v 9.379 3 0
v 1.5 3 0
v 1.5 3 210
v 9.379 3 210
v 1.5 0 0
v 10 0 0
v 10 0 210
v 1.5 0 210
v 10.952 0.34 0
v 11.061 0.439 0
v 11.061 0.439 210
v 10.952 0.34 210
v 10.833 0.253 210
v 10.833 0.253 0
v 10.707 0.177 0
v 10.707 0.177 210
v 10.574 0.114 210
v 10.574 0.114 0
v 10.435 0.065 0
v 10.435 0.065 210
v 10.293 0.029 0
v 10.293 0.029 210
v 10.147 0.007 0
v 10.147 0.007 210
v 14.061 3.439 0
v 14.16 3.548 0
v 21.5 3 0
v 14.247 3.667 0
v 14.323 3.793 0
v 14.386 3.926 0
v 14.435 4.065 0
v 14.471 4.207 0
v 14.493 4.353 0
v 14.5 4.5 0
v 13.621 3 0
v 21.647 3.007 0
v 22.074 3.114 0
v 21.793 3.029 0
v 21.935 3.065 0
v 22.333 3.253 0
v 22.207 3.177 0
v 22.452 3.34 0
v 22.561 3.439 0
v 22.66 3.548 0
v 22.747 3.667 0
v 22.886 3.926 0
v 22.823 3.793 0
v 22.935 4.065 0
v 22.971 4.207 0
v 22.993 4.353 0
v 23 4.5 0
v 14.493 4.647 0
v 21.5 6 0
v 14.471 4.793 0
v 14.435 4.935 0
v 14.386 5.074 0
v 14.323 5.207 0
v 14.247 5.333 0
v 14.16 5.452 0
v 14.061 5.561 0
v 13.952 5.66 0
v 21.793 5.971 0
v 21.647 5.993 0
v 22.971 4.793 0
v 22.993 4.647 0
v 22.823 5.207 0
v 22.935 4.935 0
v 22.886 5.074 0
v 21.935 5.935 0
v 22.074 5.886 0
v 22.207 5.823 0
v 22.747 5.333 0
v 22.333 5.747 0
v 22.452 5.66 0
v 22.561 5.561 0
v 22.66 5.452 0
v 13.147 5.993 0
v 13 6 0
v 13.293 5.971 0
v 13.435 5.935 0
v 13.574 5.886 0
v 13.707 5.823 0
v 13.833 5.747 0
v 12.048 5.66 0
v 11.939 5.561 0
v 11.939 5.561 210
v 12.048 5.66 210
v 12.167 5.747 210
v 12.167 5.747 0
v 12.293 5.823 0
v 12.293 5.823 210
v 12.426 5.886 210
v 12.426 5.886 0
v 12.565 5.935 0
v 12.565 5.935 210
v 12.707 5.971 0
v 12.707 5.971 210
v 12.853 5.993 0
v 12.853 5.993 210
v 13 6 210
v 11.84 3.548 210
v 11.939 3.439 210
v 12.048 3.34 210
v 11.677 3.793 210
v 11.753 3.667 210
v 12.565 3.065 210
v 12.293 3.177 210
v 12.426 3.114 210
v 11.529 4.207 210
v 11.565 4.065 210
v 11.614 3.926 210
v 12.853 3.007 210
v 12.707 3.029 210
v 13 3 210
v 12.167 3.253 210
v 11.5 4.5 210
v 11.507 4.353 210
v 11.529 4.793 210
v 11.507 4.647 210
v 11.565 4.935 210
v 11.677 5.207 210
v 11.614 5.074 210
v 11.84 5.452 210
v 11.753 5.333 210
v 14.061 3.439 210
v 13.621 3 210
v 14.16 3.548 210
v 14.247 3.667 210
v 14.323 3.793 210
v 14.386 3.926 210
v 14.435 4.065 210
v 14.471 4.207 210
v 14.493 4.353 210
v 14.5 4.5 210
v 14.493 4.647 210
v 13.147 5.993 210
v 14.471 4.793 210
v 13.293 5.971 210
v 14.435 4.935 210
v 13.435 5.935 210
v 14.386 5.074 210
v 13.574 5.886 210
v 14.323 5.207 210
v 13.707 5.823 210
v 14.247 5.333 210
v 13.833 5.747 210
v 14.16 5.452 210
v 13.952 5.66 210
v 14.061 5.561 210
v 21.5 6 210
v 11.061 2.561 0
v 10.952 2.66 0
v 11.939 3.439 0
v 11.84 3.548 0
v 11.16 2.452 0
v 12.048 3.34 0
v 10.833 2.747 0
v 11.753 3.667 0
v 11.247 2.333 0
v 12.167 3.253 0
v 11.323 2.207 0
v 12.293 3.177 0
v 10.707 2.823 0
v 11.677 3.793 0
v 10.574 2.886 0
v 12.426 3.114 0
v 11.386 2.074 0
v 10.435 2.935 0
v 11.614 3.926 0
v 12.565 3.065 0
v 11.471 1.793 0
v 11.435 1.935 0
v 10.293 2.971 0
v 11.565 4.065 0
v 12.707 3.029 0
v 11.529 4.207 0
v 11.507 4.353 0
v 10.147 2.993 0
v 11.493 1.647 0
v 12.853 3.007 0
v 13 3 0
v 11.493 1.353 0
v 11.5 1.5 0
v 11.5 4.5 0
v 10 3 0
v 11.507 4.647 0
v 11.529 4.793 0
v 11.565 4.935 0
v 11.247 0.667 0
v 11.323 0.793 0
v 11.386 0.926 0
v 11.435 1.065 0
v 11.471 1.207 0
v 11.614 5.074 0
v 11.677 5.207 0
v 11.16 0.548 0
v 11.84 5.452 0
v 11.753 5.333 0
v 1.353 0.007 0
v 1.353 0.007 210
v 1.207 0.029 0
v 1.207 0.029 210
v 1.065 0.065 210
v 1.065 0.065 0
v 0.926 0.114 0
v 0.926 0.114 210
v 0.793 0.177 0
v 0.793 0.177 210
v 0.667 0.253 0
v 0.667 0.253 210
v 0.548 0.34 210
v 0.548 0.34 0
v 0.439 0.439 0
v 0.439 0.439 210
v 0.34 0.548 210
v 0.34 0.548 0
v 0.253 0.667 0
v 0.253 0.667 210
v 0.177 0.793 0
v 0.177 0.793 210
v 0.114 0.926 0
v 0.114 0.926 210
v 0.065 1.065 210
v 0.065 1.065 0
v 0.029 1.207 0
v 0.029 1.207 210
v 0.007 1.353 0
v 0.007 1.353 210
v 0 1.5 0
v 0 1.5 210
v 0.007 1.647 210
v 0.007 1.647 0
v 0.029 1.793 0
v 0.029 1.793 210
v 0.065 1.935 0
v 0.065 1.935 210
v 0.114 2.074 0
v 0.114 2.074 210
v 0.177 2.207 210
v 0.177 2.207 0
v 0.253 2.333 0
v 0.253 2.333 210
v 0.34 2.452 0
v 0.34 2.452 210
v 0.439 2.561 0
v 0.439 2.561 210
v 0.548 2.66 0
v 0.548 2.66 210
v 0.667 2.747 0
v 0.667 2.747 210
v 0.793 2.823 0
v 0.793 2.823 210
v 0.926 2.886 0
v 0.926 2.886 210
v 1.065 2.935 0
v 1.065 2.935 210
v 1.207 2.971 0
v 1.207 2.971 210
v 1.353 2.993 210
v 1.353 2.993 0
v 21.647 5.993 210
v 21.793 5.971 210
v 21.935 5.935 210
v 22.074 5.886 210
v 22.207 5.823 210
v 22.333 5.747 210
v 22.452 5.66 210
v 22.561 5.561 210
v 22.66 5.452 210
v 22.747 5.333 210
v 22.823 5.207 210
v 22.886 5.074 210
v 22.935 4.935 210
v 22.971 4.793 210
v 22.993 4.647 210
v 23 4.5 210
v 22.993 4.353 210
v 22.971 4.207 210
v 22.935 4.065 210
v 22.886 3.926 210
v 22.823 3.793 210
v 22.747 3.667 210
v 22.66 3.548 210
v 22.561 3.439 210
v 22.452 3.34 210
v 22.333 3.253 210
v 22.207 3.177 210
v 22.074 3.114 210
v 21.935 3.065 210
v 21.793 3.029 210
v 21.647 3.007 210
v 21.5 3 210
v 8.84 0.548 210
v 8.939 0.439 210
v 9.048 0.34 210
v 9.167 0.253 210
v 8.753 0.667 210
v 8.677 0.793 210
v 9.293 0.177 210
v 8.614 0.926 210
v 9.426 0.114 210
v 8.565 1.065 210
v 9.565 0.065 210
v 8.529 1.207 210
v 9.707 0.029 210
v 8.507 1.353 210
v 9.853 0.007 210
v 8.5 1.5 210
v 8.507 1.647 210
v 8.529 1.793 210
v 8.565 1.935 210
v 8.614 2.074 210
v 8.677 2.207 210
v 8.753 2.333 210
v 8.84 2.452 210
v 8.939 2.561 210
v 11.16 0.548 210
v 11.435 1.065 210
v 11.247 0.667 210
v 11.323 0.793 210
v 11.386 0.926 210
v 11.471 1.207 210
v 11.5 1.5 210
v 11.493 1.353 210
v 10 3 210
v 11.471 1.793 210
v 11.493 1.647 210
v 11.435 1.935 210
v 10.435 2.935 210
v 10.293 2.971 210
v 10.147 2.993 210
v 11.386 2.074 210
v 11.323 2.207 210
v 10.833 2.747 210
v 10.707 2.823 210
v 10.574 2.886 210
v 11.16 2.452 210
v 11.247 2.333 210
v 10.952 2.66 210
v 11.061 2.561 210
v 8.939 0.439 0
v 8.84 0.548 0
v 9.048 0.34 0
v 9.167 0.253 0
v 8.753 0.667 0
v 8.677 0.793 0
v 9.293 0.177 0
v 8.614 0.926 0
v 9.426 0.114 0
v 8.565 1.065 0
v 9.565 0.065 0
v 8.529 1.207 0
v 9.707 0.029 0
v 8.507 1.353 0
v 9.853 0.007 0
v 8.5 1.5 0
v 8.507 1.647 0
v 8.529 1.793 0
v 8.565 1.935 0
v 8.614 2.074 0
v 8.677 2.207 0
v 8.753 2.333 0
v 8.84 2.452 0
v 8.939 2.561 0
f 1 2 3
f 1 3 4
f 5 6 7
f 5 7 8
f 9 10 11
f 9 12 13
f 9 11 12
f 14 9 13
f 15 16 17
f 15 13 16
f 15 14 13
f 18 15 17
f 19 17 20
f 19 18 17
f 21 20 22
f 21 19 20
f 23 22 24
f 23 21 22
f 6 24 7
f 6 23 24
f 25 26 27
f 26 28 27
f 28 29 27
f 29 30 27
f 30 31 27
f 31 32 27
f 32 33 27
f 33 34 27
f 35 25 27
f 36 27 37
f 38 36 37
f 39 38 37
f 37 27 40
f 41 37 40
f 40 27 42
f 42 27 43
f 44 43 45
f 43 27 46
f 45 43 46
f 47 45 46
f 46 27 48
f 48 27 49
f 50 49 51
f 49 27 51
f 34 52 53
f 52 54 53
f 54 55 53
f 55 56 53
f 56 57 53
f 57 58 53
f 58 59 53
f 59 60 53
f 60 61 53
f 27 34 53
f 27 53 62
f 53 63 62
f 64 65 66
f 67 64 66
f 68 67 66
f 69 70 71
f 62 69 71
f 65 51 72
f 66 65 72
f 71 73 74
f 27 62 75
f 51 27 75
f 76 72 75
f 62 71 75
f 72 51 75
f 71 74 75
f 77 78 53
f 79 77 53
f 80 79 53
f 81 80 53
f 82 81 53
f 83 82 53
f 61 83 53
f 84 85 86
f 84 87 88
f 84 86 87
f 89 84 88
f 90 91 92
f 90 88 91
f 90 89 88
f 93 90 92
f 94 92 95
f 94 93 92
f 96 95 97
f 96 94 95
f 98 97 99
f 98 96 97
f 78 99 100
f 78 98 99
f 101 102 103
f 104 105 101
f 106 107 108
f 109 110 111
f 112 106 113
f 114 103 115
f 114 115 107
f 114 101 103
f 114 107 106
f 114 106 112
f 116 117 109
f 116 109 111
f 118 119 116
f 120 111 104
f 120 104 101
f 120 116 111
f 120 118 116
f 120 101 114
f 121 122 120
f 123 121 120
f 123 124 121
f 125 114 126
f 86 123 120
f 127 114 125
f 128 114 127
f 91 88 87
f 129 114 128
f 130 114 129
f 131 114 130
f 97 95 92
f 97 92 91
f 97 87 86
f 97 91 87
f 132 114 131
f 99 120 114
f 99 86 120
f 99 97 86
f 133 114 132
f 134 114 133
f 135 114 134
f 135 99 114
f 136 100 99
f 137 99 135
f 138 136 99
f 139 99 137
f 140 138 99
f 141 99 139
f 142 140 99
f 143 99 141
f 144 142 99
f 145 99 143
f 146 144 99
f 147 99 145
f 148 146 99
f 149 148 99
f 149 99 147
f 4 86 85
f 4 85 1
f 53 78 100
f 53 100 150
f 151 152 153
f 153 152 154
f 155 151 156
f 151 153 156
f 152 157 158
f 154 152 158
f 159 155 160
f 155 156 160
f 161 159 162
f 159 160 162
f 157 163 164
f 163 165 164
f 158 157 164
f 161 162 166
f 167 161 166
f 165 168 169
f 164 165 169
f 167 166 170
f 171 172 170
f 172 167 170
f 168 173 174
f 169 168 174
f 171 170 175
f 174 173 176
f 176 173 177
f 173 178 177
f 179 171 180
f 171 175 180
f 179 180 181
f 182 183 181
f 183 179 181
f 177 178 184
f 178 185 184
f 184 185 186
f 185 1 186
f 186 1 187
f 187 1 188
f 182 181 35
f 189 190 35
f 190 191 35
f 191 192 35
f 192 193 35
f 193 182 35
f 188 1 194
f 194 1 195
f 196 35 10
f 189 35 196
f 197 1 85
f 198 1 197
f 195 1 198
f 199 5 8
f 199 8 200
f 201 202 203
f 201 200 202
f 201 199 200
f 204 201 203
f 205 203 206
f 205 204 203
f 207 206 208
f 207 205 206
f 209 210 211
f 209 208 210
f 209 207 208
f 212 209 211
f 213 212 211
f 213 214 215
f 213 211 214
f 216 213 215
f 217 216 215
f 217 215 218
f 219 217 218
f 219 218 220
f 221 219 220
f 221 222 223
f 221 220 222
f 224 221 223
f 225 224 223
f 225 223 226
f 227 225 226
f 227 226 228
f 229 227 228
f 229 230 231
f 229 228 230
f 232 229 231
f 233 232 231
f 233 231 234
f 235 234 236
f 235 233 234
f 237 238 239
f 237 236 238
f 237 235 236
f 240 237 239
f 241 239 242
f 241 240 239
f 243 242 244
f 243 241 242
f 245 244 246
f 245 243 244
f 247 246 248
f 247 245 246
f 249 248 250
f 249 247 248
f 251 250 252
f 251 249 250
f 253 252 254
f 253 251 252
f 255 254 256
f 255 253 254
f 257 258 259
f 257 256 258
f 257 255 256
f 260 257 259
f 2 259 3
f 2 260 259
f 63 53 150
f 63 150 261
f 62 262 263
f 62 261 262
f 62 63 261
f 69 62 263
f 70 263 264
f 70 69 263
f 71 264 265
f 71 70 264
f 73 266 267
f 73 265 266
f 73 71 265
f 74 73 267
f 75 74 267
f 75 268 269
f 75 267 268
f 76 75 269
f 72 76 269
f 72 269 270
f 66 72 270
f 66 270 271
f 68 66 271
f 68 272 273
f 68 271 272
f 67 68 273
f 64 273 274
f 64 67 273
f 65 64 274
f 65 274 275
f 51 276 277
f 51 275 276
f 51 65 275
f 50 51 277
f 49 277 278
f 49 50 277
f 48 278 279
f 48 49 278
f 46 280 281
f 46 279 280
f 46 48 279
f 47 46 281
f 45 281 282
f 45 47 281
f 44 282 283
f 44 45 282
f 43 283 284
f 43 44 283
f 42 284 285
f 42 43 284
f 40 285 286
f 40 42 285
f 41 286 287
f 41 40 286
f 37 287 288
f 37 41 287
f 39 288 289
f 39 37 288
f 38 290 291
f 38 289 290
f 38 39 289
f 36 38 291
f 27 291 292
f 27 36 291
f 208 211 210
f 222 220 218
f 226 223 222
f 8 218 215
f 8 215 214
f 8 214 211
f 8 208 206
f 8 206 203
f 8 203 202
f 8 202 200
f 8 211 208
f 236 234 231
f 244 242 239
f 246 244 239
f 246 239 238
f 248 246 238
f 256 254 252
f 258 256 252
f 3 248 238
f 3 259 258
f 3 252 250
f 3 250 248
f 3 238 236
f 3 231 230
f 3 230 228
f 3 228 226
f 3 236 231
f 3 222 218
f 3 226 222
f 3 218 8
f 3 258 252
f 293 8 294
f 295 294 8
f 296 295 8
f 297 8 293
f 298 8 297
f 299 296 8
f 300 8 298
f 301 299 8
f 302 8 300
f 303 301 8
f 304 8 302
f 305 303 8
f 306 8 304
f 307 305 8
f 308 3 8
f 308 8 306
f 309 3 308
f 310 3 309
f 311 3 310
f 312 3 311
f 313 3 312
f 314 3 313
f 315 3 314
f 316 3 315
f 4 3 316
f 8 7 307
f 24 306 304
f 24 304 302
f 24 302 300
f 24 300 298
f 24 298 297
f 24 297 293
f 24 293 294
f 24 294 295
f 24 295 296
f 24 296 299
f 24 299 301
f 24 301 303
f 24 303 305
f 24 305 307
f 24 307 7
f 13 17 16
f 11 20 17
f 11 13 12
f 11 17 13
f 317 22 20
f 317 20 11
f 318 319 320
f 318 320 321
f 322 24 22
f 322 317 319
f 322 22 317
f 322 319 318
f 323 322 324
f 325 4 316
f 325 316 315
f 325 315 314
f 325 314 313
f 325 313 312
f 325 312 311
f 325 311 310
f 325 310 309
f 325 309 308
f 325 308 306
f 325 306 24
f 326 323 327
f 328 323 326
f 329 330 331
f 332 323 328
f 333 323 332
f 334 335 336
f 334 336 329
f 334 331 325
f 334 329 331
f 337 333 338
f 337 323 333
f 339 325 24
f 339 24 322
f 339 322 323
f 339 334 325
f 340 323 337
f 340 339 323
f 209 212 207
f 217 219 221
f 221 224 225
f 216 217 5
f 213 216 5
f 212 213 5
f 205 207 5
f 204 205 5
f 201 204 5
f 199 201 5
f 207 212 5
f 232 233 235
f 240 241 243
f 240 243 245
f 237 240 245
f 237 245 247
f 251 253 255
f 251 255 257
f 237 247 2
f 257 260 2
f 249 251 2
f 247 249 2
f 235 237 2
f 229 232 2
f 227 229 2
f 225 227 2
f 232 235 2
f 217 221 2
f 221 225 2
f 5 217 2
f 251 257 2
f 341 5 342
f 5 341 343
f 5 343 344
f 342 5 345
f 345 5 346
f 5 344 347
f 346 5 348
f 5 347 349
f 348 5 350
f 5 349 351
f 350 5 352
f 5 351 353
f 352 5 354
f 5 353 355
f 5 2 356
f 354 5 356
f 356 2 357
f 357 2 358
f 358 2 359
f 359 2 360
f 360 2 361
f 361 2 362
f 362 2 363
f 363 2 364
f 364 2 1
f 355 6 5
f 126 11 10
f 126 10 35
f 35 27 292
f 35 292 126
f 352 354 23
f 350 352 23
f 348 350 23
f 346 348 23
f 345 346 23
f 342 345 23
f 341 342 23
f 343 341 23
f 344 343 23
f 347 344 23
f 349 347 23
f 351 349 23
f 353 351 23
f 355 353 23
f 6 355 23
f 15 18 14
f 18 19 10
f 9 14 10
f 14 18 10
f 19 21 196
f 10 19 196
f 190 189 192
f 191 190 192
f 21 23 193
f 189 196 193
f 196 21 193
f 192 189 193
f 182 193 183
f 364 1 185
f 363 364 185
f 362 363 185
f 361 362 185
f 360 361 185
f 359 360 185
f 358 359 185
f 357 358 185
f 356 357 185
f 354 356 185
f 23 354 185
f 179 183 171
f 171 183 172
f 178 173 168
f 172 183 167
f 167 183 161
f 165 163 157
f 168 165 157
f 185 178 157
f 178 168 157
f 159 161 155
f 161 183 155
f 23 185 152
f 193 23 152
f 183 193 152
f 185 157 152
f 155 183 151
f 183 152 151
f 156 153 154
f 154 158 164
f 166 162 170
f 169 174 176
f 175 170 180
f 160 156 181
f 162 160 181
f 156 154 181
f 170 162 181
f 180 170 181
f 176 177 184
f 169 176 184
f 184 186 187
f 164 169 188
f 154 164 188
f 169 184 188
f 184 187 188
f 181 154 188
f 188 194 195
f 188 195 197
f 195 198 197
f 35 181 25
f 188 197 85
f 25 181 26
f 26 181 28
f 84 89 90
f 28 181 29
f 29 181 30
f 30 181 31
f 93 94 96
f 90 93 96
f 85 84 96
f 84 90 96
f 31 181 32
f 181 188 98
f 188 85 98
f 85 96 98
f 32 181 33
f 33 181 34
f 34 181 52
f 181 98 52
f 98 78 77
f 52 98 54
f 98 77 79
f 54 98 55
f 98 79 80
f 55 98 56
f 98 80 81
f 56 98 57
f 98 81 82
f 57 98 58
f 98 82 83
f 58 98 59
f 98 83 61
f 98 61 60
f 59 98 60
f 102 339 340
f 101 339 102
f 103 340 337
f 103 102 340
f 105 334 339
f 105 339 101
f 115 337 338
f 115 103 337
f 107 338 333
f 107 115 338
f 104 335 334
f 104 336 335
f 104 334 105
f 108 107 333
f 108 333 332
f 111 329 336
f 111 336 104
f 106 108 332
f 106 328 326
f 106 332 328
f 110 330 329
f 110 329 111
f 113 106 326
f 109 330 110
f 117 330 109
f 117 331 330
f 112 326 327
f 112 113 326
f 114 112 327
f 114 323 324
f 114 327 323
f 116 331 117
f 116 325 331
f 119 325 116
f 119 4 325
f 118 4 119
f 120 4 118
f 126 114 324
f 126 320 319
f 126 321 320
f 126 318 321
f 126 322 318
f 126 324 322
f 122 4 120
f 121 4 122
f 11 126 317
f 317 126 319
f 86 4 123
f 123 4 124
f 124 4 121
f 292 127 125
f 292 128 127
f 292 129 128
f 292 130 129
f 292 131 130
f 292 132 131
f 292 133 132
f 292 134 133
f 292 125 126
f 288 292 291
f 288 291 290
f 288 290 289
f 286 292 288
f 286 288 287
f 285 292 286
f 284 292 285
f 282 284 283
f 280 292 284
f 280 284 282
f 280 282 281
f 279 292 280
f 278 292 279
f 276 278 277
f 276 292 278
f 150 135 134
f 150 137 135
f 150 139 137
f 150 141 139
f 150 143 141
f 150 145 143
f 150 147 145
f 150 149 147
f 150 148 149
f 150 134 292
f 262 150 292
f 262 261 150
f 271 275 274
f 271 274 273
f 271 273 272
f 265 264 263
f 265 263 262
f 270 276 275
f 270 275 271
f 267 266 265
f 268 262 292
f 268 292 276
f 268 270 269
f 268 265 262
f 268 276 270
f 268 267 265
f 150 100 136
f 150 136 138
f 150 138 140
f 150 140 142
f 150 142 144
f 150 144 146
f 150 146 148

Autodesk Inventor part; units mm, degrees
ref_plane "YZ Plane" through (0, 0, 0) normal (1, 0, 0) x (0, 1, 0)
ref_plane "XZ Plane" through (0, 0, 0) normal (0, 1, 0) x (-1, 0, 0)
ref_plane "XY Plane" through (0, 0, 0) normal (0, 0, 1) x (1, 0, 0)
sketch "Sketch1" plane through (0, 0, 0) normal (0, 0, 1) x (1, 0, 0)
  line L0 (0, 0) -> (23, 0) construction
  line L1 (23, 0) -> (23, 6) construction
  line L2 (23, 6) -> (0, 6) construction
  line L3 (0, 6) -> (0, 0) construction
  line L4 (0, 3) -> (23, 3) construction
  line L5 (11.5, 0) -> (11.5, 3) construction
  line L6 (11.5, 3) -> (11.5, 6) construction
  line L7 (11.5, 1.5) -> (0, 1.5) construction
  line L8 (11.5, 4.5) -> (23, 4.5) construction
  line L9 (0, 1.5) -> (11.5, 1.5) construction
  line L10 (1.5, 3) -> (10, 3)
  line L11 (10, 0) -> (1.5, 0)
  arc A0 (1.5, 3) -> (1.5, 0) centre (1.5, 1.5) ccw
  arc A1 (10, 0) -> (10, 3) centre (10, 1.5) ccw
  line L12 (11.5, 4.5) -> (23, 4.5) construction
  line L13 (13, 6) -> (21.5, 6)
  line L14 (21.5, 3) -> (13, 3)
  arc A2 (13, 6) -> (13, 3) centre (13, 4.5) ccw
  arc A3 (21.5, 3) -> (21.5, 6) centre (21.5, 4.5) ccw
  line L15 (10, 1.5) -> (13, 4.5) construction
  line L16 (11.0607, 0.4393) -> (14.0607, 3.4393)
  line L17 (11.9393, 5.5607) -> (8.9393, 2.5607)
  arc A4 (8.9393, 2.5607) -> (11.0607, 0.4393) centre (10, 1.5) ccw
  arc A5 (14.0607, 3.4393) -> (11.9393, 5.5607) centre (13, 4.5) ccw
  point P0 (5.75, 1.5)
  point P1 (17.25, 4.5)
  point P2 (11.5, 3)
  point P3 (9.3787, 3)
  point P4 (13.6213, 3)
  dimension "d6" = 23
  dimension "d7" = 6
  dimension "d8" = 3
extrude "Extrusion1" add sketch "Sketch1" along normal blind 210
properties part number "Door Seal" material "Rubber"
